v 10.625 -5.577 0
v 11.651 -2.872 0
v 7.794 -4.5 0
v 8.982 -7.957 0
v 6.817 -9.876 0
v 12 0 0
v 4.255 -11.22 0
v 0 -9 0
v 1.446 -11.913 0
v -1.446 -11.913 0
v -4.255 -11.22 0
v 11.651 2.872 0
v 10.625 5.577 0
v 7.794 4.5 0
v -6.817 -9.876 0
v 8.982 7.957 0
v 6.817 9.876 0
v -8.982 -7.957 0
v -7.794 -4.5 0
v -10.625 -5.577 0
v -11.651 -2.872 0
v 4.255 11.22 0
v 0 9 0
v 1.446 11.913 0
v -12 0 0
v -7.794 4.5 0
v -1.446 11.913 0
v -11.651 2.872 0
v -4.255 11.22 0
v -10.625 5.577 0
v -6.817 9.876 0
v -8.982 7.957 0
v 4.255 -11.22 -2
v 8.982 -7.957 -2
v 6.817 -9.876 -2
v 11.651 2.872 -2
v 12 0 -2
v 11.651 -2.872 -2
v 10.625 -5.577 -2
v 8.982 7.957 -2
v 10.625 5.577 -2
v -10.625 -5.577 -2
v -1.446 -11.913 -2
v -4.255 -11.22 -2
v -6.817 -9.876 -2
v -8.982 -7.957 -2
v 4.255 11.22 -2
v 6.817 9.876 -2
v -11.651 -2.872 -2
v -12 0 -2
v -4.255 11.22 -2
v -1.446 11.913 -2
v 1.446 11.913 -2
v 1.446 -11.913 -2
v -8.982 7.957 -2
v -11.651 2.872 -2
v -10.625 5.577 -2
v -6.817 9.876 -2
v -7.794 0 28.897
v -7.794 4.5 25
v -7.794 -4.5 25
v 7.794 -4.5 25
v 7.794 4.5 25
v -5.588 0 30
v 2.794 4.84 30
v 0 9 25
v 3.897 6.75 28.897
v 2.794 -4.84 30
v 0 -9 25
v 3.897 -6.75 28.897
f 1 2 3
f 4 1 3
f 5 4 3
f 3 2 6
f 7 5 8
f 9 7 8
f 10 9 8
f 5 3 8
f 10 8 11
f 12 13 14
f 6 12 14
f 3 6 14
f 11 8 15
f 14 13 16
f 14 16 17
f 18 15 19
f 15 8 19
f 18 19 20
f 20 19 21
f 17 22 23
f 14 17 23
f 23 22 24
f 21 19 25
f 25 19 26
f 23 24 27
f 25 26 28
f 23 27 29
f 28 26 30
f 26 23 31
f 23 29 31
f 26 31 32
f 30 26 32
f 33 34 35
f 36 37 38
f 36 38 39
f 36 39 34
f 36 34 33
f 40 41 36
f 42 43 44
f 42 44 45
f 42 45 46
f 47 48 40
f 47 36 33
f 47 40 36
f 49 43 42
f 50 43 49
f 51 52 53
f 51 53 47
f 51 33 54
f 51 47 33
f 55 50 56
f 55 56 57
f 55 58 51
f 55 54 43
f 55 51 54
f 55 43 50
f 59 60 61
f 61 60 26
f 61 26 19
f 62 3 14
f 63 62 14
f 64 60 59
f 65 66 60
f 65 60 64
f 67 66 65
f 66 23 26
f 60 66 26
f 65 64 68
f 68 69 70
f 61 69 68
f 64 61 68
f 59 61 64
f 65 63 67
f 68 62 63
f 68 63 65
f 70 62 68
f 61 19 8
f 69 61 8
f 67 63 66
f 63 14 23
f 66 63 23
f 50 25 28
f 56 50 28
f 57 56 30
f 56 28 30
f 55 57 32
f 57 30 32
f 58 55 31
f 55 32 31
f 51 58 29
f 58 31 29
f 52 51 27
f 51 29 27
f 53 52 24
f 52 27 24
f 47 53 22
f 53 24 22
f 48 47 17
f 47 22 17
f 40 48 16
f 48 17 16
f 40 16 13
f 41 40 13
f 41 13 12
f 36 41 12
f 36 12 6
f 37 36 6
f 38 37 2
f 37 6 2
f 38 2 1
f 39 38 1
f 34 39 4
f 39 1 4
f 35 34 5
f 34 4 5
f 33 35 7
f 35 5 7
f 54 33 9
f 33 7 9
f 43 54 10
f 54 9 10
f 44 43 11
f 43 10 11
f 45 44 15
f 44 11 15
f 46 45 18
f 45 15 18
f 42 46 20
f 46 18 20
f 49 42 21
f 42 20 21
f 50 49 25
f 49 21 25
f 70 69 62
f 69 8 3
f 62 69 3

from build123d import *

# Parameters (mm, degrees)
SALIENTE_EXTRUIR1_DEPTH = 30
CROQUIS2_R              = 12
SALIENTE_EXTRUIR2_DEPTH = 2
CHAMFER1_SIZE           = 5


with BuildPart() as part:
    # Croquis1 → Saliente-Extruir1 (new body)
    with BuildSketch(Plane.XY):
        Polygon((0, 9), (-7.794228634, 4.5), (-7.794228634, -4.5), (0, -9), (7.794228634, -4.5), (7.794228634, 4.5), align=None)
    extrude(amount=SALIENTE_EXTRUIR1_DEPTH)

    # Croquis2 → Saliente-Extruir2 (add)
    with BuildSketch(Plane(origin=(0, 0, 0), x_dir=(-1, 0, 0), z_dir=(0, 0, -1))):
        Circle(CROQUIS2_R)
    extrude(amount=SALIENTE_EXTRUIR2_DEPTH)

    # Chamfer1
    # the kernel refuses this chamfer: 5 mm, written as the material it takes off along each edge
    with BuildSketch(Plane(origin=(-18.929942624, 1.92920747, 30), x_dir=(-0.013747938305293065, -0.023812127644090277, -0.9996219169112968), z_dir=(0.8660254037844416, -0.49999999999999495, 0)), Plane(origin=(7.794228634, -17.35841494, 30), x_dir=(0.027495876610586317, 0, -0.9996219169112968), z_dir=(0, 1, 0)), Plane(origin=(11.13571399, 15.42920747, 30), x_dir=(-0.013747938305293275, 0.023812127644090242, -0.9996219169112968), z_dir=(-0.8660254037844379, -0.5000000000000012, 0))) as chamfer1_piece_1:
        Polygon((CHAMFER1_SIZE * 0.999621916911, CHAMFER1_SIZE * 0.0274958766106), (-CHAMFER1_SIZE * 0.0274958766106, CHAMFER1_SIZE * 0.999621916911), (0, 0), align=None)
    extrude(amount=34.71682988, mode=Mode.SUBTRACT)


solid = part.part
